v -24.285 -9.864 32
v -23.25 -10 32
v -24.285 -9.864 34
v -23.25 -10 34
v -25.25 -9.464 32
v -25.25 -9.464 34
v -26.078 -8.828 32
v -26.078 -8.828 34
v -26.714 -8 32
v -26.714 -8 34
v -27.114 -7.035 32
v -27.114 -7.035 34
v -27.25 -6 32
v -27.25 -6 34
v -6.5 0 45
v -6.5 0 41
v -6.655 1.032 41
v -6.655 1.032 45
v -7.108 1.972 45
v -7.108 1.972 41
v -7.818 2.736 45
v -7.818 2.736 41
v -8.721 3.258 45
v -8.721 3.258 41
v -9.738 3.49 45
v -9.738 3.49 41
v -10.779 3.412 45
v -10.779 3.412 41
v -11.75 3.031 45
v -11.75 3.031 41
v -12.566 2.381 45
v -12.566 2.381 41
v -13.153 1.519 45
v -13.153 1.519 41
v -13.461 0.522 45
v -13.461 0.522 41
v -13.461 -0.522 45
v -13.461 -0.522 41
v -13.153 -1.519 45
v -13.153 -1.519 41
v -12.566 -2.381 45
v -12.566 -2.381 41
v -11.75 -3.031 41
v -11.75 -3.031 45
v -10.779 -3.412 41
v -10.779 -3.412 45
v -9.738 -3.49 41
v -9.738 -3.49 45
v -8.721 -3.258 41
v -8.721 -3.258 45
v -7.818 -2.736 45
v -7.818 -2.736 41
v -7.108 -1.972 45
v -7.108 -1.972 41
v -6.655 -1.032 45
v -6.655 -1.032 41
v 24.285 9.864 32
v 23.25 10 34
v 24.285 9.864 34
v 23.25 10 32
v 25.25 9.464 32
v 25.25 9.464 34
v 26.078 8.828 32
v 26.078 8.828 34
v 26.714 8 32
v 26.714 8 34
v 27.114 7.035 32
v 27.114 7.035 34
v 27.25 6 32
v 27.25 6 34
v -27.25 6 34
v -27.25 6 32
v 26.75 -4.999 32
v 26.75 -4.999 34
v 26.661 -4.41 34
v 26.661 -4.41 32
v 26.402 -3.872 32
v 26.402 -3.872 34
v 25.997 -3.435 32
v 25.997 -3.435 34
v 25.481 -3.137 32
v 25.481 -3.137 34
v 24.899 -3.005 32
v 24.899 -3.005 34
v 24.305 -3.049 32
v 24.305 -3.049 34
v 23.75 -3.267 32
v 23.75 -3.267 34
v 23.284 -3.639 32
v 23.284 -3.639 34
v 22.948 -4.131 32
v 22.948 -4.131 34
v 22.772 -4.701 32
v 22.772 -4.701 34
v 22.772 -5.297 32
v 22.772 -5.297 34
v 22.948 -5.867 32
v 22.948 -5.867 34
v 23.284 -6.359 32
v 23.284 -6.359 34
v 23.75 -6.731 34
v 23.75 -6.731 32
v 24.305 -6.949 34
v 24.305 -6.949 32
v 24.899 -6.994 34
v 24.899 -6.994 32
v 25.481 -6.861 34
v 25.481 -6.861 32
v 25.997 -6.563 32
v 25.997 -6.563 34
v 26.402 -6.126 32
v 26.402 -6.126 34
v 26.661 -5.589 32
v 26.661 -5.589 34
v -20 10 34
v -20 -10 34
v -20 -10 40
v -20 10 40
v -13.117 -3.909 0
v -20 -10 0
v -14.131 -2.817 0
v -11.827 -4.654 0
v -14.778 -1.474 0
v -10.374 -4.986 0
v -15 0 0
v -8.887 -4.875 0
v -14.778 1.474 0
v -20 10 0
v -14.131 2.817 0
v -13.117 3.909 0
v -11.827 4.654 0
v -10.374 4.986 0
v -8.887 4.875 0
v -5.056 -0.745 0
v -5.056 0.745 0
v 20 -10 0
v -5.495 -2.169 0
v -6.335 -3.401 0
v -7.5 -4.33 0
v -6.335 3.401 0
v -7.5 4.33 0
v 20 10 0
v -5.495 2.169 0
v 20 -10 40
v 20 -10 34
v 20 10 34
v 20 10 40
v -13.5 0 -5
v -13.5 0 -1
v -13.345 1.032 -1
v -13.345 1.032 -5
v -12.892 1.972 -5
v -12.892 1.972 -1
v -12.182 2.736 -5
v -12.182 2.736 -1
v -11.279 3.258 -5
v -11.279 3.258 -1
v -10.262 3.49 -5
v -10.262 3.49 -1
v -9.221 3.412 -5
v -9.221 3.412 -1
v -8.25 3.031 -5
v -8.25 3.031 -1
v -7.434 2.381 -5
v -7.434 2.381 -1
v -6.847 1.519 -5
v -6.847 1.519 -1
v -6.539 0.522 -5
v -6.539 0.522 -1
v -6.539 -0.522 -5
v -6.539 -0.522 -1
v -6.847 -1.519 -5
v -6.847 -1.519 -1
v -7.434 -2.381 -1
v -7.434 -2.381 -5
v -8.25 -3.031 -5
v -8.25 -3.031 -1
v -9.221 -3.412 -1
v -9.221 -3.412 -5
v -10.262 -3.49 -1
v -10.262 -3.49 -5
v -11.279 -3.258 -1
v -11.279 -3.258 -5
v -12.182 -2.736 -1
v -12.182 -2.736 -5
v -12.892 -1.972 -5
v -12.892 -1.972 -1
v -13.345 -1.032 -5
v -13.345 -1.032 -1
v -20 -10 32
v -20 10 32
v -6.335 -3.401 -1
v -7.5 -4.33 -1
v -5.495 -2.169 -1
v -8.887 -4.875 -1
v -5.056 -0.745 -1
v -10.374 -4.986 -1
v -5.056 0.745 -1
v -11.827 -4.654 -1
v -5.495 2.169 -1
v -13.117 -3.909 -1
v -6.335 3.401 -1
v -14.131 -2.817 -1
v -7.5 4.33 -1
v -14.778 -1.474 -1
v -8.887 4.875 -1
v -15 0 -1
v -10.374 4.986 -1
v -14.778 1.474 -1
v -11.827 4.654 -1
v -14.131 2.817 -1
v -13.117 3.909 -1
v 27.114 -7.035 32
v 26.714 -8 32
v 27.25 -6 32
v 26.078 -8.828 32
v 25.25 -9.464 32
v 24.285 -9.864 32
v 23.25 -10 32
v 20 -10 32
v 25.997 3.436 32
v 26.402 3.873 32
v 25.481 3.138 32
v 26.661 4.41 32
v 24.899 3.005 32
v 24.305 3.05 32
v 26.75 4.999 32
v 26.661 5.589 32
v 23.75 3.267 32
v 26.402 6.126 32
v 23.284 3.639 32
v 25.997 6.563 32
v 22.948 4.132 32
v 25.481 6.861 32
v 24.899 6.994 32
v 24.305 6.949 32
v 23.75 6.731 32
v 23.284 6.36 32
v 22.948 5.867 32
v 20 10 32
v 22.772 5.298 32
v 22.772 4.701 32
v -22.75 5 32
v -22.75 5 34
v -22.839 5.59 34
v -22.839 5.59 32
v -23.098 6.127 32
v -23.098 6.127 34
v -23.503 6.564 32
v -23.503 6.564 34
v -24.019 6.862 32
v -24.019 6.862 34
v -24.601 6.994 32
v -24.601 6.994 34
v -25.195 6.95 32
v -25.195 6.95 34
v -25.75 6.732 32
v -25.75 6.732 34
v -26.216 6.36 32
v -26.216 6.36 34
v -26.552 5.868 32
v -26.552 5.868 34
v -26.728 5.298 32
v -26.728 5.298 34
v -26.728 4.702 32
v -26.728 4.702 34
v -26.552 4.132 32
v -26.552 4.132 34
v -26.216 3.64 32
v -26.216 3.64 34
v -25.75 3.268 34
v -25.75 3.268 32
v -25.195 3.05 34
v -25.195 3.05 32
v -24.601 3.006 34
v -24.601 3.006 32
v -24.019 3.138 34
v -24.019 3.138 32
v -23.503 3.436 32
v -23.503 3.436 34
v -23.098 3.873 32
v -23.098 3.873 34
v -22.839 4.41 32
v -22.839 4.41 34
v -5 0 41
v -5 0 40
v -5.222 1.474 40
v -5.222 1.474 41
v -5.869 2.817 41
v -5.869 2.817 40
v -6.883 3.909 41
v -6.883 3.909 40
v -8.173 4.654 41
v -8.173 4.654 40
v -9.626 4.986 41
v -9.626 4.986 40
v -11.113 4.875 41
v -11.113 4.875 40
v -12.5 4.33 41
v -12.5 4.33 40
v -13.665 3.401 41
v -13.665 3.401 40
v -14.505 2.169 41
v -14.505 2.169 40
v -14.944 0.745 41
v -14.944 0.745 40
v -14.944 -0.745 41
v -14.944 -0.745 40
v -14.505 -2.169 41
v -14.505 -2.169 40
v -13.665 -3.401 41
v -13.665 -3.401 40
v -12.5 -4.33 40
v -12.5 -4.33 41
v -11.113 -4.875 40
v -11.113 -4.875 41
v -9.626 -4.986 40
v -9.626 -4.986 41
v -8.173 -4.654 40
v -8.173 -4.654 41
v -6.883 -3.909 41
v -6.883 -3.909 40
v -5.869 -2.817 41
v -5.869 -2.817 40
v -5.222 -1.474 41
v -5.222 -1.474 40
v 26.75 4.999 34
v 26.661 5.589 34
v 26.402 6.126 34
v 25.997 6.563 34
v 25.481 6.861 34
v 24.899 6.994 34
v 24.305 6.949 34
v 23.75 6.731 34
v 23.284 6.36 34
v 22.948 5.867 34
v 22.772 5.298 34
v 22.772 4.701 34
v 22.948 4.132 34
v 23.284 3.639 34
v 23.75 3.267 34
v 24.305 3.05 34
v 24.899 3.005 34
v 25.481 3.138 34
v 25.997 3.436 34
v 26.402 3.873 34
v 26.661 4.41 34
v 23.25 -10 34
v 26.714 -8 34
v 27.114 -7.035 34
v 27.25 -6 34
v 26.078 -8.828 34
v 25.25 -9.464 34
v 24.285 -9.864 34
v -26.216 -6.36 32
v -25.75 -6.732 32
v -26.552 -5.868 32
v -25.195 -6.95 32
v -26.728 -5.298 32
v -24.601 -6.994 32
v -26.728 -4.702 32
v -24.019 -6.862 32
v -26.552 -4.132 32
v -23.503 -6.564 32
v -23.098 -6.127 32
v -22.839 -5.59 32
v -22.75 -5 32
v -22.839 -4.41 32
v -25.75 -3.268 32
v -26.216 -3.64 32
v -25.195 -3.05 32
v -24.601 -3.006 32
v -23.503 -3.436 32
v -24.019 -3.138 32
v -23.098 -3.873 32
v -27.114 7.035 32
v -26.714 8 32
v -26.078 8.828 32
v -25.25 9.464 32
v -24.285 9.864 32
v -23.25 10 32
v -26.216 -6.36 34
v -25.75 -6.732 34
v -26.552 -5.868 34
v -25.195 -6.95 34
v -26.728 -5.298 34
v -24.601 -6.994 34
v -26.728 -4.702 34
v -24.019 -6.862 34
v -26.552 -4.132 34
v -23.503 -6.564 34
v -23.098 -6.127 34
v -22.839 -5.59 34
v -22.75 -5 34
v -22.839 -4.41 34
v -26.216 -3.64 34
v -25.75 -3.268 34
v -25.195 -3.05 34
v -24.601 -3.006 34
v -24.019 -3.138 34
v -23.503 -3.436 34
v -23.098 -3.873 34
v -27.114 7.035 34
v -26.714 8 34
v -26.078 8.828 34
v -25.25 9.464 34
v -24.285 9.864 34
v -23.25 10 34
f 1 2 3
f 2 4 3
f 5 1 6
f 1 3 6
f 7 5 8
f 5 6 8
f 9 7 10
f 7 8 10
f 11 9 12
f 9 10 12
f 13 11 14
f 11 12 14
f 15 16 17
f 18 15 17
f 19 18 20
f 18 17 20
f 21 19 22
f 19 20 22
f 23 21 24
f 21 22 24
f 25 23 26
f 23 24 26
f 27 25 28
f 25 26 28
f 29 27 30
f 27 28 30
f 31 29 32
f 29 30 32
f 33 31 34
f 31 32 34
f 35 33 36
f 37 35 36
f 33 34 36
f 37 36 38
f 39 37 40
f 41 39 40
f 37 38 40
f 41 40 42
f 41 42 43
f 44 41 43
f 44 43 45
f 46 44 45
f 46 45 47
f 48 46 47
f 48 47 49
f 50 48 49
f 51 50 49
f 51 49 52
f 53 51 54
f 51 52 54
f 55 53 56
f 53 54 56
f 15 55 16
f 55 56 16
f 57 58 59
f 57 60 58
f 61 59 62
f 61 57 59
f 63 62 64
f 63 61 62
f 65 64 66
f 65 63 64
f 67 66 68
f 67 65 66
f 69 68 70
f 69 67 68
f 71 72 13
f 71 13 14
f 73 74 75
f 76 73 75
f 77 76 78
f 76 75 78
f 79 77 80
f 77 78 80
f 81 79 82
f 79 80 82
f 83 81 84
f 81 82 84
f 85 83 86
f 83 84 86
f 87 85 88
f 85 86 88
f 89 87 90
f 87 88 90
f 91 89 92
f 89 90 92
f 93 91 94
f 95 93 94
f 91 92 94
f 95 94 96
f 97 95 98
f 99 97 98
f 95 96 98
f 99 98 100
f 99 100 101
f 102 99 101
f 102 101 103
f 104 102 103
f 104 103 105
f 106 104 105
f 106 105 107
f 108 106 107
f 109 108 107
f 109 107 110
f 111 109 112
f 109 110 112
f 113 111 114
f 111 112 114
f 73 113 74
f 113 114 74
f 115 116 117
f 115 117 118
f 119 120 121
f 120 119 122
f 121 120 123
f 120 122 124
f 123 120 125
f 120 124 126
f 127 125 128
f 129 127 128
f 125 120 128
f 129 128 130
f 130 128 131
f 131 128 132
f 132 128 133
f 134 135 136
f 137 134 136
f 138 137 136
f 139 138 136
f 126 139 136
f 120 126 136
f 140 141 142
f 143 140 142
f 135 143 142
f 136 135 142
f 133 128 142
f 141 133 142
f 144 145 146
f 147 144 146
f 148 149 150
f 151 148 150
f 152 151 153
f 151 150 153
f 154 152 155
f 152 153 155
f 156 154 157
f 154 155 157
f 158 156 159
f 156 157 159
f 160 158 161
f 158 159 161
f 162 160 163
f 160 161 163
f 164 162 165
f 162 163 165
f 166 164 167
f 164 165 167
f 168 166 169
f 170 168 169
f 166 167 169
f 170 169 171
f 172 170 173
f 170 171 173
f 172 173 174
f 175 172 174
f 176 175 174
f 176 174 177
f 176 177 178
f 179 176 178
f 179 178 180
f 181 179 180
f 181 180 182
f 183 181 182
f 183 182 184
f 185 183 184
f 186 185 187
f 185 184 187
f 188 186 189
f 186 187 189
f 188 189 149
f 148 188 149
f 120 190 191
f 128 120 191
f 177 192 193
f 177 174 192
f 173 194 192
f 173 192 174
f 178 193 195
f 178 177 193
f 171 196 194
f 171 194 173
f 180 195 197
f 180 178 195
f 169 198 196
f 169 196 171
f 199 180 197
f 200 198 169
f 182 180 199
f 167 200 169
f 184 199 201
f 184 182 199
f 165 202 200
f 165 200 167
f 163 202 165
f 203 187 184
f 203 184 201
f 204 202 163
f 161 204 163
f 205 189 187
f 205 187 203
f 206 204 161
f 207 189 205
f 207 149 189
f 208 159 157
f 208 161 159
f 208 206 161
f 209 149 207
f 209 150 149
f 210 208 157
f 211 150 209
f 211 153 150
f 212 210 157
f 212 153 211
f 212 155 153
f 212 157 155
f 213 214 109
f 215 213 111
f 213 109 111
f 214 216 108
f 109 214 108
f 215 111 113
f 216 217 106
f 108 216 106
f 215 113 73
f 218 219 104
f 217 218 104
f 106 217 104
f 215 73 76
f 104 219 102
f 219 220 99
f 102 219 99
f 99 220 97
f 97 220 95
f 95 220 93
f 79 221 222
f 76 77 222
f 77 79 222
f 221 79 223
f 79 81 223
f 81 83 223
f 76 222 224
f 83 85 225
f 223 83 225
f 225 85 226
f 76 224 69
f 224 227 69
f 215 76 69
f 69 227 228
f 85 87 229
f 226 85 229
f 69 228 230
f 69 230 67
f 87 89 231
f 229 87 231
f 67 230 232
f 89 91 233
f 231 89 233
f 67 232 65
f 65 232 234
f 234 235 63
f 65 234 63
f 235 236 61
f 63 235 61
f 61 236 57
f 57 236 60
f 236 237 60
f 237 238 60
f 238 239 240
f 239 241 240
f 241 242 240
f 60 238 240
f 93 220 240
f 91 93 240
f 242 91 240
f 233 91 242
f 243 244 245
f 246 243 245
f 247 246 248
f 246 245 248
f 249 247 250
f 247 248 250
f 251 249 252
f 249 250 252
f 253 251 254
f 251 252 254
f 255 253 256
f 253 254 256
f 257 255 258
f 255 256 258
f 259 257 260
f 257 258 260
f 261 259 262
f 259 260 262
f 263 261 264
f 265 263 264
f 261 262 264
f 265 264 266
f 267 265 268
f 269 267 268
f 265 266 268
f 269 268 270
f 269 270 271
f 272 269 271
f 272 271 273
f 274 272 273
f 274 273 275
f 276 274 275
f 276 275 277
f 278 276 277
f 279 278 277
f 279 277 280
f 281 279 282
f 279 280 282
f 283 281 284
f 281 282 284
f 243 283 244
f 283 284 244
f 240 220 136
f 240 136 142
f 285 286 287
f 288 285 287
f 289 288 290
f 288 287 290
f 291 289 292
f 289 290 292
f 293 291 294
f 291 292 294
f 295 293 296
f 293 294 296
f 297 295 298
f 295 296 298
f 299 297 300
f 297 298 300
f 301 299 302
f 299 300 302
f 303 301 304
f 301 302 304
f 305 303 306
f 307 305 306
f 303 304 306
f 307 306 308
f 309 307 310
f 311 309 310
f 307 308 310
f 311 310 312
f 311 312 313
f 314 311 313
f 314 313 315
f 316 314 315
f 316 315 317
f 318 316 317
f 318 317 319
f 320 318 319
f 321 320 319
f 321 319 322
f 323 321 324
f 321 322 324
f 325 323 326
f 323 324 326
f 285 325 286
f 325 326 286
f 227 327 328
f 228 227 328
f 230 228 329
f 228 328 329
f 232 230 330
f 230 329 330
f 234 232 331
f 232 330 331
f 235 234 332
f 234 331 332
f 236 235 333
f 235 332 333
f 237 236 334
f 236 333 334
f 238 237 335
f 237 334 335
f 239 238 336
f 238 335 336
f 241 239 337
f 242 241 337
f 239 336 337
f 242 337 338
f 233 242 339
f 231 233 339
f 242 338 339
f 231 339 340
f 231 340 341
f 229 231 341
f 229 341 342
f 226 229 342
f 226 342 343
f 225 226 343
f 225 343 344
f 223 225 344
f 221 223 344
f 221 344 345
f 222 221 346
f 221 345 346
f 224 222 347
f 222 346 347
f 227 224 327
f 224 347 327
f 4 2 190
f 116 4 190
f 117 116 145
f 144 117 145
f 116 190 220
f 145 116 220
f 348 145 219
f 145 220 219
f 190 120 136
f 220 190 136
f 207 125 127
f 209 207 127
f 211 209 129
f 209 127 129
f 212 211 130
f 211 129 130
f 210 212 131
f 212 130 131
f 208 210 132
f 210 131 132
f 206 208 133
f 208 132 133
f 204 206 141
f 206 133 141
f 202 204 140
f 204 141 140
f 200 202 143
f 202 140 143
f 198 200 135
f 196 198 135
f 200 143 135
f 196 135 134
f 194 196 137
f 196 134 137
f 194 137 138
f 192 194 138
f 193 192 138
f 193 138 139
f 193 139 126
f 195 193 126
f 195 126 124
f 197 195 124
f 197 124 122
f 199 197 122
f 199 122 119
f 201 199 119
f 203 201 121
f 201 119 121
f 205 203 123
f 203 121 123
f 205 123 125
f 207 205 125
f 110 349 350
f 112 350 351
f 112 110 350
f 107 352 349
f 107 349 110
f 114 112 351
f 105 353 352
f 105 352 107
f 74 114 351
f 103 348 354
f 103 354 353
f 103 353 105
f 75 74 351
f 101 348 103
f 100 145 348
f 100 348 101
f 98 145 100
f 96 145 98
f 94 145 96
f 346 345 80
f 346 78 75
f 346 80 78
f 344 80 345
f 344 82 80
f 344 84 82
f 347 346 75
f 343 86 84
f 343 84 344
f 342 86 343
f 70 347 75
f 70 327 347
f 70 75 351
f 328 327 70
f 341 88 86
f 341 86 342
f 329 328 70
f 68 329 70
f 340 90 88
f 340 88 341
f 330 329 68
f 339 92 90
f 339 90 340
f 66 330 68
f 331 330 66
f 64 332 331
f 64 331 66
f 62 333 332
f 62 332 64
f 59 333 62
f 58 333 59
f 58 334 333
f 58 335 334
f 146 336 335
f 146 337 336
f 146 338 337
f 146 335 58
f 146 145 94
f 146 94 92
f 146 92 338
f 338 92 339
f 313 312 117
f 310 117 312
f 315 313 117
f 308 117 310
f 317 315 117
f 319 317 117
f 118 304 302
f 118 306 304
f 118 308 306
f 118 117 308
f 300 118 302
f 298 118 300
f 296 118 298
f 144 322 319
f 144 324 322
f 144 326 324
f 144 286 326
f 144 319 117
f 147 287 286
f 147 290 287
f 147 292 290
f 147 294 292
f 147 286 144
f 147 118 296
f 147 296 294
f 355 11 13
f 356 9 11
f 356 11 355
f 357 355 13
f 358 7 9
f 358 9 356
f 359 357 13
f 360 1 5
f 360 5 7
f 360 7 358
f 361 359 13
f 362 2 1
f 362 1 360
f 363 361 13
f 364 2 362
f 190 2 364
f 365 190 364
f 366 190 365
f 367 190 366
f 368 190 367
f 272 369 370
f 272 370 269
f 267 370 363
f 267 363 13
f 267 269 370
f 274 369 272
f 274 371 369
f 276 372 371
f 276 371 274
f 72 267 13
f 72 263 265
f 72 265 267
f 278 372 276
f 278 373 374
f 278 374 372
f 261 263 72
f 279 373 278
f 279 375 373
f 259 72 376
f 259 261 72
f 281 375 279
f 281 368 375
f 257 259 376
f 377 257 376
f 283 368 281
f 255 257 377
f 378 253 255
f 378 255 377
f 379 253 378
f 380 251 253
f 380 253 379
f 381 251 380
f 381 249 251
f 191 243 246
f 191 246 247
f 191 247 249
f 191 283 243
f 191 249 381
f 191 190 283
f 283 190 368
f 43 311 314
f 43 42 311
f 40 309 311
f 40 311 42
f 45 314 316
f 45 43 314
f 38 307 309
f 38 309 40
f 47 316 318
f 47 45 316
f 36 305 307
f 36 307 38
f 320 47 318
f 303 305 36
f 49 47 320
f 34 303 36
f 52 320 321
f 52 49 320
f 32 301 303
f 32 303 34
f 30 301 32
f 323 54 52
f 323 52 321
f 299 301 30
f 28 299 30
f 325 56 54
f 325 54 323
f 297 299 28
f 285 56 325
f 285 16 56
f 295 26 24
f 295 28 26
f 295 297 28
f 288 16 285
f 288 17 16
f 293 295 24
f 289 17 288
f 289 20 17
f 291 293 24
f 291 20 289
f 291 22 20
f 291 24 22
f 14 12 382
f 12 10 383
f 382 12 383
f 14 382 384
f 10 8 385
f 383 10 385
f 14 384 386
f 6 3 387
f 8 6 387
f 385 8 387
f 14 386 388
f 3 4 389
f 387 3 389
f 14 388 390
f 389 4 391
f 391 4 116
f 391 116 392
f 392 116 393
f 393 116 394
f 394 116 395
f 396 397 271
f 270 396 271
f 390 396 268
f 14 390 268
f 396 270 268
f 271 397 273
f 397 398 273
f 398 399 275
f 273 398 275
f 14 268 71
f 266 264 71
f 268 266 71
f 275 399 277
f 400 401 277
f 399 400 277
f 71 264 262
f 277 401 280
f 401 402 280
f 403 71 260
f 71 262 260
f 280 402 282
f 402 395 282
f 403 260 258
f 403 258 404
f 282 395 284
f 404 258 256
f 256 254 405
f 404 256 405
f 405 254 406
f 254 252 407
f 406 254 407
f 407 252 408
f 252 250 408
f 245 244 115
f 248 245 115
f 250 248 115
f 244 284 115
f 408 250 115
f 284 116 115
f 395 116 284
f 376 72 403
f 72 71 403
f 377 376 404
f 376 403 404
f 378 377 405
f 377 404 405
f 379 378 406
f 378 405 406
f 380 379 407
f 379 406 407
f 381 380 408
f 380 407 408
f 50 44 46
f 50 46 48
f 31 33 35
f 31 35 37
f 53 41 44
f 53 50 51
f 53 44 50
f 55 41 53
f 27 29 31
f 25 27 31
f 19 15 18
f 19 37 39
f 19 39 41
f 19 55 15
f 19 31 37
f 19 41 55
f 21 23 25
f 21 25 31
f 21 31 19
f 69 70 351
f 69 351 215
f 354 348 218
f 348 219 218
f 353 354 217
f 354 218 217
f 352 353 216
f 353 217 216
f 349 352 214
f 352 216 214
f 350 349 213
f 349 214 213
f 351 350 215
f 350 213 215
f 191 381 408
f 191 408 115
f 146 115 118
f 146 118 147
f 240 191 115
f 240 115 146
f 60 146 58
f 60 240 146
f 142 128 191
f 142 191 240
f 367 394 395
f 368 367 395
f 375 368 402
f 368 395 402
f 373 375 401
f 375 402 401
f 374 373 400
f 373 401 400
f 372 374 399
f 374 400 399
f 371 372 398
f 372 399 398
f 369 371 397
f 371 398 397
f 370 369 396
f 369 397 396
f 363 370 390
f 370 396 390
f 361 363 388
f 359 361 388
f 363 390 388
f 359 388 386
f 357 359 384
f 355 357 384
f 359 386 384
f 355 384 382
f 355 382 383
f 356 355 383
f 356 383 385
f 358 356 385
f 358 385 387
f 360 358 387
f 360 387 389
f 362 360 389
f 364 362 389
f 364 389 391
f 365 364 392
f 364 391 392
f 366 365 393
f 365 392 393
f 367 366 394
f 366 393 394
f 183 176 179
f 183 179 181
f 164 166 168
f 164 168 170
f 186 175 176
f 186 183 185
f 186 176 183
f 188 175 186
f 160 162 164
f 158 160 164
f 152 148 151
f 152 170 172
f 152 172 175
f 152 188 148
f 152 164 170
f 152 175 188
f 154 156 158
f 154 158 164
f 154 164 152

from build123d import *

# Parameters (mm, degrees)
SKETCH1_W           = 40
SKETCH1_H           = 20
BOSS_EXTRUDE2_DEPTH = 40
SKETCH2_W           = 2
SKETCH2_H           = 20
BOSS_EXTRUDE3_DEPTH = 7.25
SKETCH3_R           = 2
CUT_EXTRUDE1_DEPTH  = 2
FILLET3_R           = 4
SKETCH4_W           = 2
SKETCH4_H           = 20
BOSS_EXTRUDE4_DEPTH = 7.25
SKETCH5_R           = 2
CUT_EXTRUDE2_DEPTH  = 2
FILLET4_R           = 4
SKETCH6_R           = 5
BOSS_EXTRUDE5_DEPTH = 1
SKETCH7_R           = 3.5
BOSS_EXTRUDE7_DEPTH = 4
SKETCH9_R           = 5
BOSS_EXTRUDE8_DEPTH = 1
SKETCH10_R          = 3.5
BOSS_EXTRUDE9_DEPTH = 4


with BuildPart() as part:
    # Sketch1 → Boss-Extrude2 (new body)
    with BuildSketch(Plane.XY):
        Rectangle(SKETCH1_W, SKETCH1_H)
    extrude(amount=BOSS_EXTRUDE2_DEPTH)

    # Sketch2 → Boss-Extrude3 (add)
    with BuildSketch(Plane(origin=(20, 0, 0), x_dir=(0, 0, -1), z_dir=(1, 0, 0))):
        with Locations((-33, 0)):
            Rectangle(SKETCH2_W, SKETCH2_H)
    extrude(amount=BOSS_EXTRUDE3_DEPTH)

    # Sketch3 → Cut-Extrude1 (cut)
    with BuildSketch(Plane.XY.offset(34)):
        with Locations((24.75, -4.99913934)):
            Circle(SKETCH3_R)
        with Locations((24.75, 4.999429987)):
            Circle(SKETCH3_R)
    extrude(amount=-CUT_EXTRUDE1_DEPTH, mode=Mode.SUBTRACT)

    # Fillet3
    fillet3_edges = [part.edges().sort_by_distance(p)[0] for p in [
        (27.25, -10, 33),
        (27.25, 10, 33),
    ]]
    fillet(fillet3_edges, radius=FILLET3_R)

    # Sketch4 → Boss-Extrude4 (add)
    with BuildSketch(Plane.ZY.offset(20)):
        with Locations((33, 0)):
            Rectangle(SKETCH4_W, SKETCH4_H)
    extrude(amount=BOSS_EXTRUDE4_DEPTH)

    # Sketch5 → Cut-Extrude2 (cut)
    with BuildSketch(Plane.XY.offset(34)):
        with Locations((-24.75, 5)):
            Circle(SKETCH5_R)
        with Locations((-24.75, -5)):
            Circle(SKETCH5_R)
    extrude(amount=-CUT_EXTRUDE2_DEPTH, mode=Mode.SUBTRACT)

    # Fillet4
    fillet4_edges = [part.edges().sort_by_distance(p)[0] for p in [
        (-27.25, -10, 33),
        (-27.25, 10, 33),
    ]]
    fillet(fillet4_edges, radius=FILLET4_R)

    # Sketch6 → Boss-Extrude5 (add)
    with BuildSketch(Plane.XY.offset(40)):
        with Locations((-10, 0)):
            Circle(SKETCH6_R)
    extrude(amount=BOSS_EXTRUDE5_DEPTH)

    # Sketch7 → Boss-Extrude7 (add)
    with BuildSketch(Plane.XY.offset(41)):
        with Locations((-10, 0)):
            Circle(SKETCH7_R)
    extrude(amount=BOSS_EXTRUDE7_DEPTH)

    # Sketch9 → Boss-Extrude8 (add)
    with BuildSketch(Plane(origin=(0, 0, 0), x_dir=(-1, 0, 0), z_dir=(0, 0, -1))):
        with Locations((10, 0)):
            Circle(SKETCH9_R)
    extrude(amount=BOSS_EXTRUDE8_DEPTH)

    # Sketch10 → Boss-Extrude9 (add)
    with BuildSketch(Plane(origin=(0, 0, -1), x_dir=(-1, 0, 0), z_dir=(0, 0, -1))):
        with Locations((10, 0)):
            Circle(SKETCH10_R)
    extrude(amount=BOSS_EXTRUDE9_DEPTH)


solid = part.part
